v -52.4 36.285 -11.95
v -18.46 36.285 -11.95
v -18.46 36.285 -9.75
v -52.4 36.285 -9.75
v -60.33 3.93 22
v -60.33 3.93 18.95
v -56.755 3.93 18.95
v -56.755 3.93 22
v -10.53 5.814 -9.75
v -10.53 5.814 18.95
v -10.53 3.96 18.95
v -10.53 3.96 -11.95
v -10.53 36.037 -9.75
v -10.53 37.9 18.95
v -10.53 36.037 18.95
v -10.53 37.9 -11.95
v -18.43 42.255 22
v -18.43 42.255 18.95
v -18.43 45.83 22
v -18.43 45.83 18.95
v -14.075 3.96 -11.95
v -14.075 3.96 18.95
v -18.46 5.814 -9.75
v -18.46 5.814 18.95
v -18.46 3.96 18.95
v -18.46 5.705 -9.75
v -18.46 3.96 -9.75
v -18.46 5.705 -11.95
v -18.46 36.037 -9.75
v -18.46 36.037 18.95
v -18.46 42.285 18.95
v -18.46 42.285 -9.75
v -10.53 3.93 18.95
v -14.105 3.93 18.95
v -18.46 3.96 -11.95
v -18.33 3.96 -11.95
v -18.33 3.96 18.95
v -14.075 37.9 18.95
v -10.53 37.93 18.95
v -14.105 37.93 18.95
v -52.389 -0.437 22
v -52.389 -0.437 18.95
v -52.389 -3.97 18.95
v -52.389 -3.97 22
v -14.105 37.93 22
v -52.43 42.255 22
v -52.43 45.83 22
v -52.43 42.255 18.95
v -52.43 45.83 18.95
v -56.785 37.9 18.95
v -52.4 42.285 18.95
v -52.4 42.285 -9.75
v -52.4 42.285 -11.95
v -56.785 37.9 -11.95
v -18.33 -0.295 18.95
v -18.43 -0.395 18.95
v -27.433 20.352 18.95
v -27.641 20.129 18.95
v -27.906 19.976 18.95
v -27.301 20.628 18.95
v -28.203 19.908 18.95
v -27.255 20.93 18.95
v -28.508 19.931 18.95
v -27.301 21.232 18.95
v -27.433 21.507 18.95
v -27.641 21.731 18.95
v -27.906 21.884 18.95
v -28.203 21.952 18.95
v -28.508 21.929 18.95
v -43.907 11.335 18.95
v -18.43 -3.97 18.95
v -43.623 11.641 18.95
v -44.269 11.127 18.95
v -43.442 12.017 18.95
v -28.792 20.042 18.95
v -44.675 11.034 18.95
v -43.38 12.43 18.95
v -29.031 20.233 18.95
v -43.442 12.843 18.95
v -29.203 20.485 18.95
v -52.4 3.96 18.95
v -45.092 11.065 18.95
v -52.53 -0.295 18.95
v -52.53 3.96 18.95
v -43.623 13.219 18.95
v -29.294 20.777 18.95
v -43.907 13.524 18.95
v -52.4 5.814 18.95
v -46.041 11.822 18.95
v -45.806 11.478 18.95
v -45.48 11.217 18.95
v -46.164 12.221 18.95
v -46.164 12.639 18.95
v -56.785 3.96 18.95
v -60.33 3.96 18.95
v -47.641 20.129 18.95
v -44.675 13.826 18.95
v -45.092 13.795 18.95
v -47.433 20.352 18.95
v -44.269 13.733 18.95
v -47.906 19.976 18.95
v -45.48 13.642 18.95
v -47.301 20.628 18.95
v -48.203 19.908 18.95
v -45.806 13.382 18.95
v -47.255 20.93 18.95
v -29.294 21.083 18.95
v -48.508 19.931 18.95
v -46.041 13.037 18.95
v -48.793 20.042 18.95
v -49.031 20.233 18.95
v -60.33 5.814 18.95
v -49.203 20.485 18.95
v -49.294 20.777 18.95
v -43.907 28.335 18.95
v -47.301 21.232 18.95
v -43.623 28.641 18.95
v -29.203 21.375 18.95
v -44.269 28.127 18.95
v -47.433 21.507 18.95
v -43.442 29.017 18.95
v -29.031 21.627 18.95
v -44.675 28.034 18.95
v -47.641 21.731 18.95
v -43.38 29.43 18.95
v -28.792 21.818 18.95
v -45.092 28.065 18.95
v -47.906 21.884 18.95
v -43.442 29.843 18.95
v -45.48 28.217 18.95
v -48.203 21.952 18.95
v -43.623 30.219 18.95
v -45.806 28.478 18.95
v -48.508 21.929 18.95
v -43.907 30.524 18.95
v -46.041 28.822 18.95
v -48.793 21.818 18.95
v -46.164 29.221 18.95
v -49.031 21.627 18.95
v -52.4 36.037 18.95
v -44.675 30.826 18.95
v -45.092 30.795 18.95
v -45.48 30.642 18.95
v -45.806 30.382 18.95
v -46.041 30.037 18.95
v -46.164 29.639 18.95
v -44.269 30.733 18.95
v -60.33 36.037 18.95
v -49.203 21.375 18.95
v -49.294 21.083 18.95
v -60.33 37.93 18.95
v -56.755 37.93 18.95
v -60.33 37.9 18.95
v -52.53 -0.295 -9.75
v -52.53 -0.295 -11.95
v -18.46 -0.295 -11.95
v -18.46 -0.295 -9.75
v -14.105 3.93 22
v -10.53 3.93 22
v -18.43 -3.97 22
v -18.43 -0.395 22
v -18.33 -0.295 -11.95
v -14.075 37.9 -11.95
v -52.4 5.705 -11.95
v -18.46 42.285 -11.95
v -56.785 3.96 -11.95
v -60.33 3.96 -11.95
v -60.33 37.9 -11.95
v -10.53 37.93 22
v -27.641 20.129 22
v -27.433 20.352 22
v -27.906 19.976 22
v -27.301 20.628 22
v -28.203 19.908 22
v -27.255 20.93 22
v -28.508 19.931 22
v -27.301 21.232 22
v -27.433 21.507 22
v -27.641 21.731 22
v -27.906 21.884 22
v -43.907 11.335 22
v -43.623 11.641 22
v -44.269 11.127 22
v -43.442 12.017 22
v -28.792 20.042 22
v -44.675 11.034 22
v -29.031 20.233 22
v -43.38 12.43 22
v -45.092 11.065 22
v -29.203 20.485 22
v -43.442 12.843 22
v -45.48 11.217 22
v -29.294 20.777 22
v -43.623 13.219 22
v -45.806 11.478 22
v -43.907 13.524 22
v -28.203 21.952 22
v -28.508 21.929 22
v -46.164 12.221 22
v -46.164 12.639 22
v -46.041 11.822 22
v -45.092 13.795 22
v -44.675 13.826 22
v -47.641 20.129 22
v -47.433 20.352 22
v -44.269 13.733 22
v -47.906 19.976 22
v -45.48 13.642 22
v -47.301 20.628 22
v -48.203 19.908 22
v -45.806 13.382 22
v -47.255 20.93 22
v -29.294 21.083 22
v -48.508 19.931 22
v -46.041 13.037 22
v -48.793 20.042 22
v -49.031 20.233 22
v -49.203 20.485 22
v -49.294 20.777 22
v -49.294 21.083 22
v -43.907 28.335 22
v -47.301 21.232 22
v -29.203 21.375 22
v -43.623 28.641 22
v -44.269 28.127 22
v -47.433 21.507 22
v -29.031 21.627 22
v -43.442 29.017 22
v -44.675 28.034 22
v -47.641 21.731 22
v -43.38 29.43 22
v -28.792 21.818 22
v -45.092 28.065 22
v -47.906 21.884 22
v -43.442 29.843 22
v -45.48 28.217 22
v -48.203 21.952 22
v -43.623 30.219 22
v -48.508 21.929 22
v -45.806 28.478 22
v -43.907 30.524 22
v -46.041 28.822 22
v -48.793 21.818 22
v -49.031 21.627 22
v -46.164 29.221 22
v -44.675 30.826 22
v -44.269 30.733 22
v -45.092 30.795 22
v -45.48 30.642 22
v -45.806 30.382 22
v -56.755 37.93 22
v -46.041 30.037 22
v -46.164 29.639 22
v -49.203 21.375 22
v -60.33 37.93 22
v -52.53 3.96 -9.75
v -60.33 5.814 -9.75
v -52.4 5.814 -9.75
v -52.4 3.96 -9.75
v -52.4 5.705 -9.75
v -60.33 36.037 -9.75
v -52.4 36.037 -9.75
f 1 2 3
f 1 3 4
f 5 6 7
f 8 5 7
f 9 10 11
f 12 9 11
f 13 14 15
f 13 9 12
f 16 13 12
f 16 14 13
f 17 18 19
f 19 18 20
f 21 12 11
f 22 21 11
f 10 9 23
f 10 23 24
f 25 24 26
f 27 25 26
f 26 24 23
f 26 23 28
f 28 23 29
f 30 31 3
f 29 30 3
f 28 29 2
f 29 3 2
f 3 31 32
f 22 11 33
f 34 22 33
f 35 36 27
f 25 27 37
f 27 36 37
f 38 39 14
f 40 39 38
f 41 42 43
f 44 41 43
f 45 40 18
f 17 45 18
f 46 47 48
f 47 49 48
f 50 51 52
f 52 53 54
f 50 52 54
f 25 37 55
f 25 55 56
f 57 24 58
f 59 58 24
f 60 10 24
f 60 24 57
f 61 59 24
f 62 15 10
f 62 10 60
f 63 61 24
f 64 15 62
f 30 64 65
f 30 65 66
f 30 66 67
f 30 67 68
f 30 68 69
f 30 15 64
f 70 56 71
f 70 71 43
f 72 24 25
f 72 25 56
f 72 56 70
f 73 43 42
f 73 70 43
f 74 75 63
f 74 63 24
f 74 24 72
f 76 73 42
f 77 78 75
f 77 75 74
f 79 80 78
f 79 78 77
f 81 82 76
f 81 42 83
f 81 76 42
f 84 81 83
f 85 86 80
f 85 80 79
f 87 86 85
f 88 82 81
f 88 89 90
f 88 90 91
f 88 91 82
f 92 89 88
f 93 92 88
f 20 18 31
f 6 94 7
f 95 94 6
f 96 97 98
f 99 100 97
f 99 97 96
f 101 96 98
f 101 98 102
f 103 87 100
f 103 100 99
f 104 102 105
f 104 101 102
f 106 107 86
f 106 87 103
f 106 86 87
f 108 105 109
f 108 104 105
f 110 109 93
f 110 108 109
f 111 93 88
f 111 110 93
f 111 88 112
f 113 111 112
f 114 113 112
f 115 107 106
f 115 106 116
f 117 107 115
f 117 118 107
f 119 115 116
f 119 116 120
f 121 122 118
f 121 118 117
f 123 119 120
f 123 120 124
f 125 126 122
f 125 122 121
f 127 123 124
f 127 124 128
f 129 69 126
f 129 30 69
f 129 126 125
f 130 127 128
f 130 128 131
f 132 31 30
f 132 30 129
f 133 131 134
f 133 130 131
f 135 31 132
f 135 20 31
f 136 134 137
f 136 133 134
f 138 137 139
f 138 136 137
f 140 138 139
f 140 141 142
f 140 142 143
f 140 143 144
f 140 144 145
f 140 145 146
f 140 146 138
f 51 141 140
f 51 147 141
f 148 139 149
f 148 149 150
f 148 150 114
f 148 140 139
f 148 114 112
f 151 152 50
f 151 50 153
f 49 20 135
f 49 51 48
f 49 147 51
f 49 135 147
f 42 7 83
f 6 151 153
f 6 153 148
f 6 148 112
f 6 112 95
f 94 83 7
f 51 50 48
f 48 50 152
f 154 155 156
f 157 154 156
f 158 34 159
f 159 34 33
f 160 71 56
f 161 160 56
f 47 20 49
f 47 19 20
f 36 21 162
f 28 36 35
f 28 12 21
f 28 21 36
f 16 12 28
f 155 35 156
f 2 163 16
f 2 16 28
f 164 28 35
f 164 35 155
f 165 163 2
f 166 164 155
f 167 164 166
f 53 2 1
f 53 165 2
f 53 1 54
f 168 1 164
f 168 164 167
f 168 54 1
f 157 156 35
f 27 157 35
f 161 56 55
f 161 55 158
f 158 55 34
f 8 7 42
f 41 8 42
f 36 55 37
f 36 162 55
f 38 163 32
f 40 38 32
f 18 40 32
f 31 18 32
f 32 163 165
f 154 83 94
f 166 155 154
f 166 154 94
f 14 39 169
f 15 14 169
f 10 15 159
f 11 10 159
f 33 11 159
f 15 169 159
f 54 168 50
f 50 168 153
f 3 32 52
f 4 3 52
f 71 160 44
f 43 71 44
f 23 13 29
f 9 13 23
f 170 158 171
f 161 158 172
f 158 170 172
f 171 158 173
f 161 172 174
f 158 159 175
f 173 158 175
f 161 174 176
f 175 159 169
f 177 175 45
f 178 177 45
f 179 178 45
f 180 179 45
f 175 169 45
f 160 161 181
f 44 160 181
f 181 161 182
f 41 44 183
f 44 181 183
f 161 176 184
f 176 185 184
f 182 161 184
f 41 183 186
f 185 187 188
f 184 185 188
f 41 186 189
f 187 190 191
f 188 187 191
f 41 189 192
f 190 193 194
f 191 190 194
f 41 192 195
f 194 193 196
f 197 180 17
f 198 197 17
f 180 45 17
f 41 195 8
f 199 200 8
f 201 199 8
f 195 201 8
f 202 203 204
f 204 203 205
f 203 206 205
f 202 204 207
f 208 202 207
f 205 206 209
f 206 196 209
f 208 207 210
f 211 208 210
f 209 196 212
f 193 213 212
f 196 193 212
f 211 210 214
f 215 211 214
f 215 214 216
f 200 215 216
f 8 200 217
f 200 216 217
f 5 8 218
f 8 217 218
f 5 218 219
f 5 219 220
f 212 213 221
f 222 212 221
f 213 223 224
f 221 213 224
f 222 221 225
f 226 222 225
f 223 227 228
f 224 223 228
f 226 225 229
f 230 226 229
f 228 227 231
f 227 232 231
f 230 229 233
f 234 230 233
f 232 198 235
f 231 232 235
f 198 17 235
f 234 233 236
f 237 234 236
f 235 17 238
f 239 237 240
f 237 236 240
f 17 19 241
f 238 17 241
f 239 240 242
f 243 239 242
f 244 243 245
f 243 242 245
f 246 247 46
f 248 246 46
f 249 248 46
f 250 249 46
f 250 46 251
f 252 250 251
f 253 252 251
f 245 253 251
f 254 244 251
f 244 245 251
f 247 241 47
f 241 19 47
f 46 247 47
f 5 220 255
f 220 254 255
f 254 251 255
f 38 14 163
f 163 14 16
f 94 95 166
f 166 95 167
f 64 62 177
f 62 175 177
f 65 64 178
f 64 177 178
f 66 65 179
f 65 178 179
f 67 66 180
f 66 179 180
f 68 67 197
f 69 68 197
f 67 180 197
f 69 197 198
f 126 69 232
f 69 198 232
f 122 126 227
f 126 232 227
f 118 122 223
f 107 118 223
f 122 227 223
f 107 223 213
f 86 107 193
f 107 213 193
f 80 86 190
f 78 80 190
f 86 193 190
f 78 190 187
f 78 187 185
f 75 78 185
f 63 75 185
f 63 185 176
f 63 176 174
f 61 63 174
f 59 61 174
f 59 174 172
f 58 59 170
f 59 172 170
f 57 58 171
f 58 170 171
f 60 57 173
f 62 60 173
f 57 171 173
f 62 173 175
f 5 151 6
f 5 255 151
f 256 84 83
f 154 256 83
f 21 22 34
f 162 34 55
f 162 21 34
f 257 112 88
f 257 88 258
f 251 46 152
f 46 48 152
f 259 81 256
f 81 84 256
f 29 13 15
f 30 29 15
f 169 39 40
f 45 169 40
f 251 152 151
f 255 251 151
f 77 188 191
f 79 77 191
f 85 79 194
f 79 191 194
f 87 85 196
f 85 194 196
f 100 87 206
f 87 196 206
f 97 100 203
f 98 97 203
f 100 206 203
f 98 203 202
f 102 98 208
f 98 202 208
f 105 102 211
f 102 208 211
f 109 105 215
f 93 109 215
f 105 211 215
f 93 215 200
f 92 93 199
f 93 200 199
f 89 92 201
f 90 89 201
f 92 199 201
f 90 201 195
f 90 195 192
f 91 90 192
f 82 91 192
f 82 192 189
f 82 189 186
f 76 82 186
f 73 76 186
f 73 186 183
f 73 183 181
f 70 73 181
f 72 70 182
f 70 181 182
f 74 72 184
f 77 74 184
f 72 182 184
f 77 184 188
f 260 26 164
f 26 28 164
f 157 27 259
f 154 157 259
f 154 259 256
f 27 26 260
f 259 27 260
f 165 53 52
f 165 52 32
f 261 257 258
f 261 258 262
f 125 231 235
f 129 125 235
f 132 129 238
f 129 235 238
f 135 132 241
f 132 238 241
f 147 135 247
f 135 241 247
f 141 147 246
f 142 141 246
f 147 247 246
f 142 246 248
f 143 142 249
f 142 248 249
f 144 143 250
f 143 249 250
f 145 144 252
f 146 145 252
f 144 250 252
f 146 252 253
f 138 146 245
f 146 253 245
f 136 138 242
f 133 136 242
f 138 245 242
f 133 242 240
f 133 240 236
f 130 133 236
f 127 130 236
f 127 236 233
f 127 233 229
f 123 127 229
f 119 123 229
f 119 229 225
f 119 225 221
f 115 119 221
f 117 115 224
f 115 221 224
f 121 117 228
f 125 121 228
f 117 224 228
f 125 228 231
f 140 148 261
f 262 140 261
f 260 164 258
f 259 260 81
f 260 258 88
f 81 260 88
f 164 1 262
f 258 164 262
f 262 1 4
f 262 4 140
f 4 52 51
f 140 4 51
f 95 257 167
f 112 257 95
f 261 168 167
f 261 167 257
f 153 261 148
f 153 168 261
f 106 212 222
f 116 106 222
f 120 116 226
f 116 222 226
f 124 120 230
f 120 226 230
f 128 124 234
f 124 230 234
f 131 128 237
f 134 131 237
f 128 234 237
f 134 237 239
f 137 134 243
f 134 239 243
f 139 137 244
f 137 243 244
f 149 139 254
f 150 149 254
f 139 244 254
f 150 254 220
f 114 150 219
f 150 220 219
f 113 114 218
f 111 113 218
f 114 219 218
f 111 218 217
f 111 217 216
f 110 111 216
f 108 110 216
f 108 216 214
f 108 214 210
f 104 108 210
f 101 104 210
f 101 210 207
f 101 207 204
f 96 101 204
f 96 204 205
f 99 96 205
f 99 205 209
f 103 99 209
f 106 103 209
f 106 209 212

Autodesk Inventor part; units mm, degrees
ref_plane "Work Plane1" through (-56.3599, 0, 22) normal (0, 0, -1) x (-1, 0, 0)
ref_plane "Arbeitsebene9" through (-61.2799, 5.9299, 18.95) normal (0, 0, 1) x (1, 0, 0)
sketch "Sketch1" plane through (-56.3599, 0, 22) normal (0, 0, -1) x (-1, 0, 0)
  line L0 (-4.0299, -0.3538) -> (-2.2322, 1.4439) construction
  arc A0 (-1.4439, 2.2322) -> (-2.2322, 1.4439) centre (-0.9299, 0.9299) ccw construction
  line L1 (-1.4439, 2.2322) -> (0.3538, 4.0299) construction
  line L2 (-37.8299, 42.8299) -> (-37.8299, 37.8299) construction
  line L3 (-37.8299, 37.8299) -> (-42.9208, 37.8299) construction
  line L4 (-37.8299, 42.2137) -> (-37.8299, 45.8299) construction
  line L5 (-37.8299, 45.8299) -> (-4.0299, 45.8299) construction
  line L6 (-4.0299, 45.8299) -> (-4.0299, 42.2137) construction
  line L7 (-4.0299, 4.0299) -> (0.3538, 4.0299) projected
  circle A1 centre (-20.9299, 20.9299) radius 17.5 projected
  line L8 (-20.9299, 58.9723) -> (17.1124, 20.9299) construction
  line L9 (17.1124, 20.9299) -> (-20.9299, -17.1124) construction
  line L10 (-20.9299, -17.1124) -> (-58.9723, 20.9299) construction
  line L11 (-58.9723, 20.9299) -> (-20.9299, 58.9723) construction
  line L12 (-20.9299, 58.9723) -> (-20.9299, -17.1124) construction
  line L13 (17.1124, 20.9299) -> (-58.9723, 20.9299) construction
  line L14 (-20.9299, 58.9723) -> (32.8701, 58.9723) construction
  line L15 (-43.4299, 43.4299) -> (1.5701, 43.4299) construction
  line L16 (1.5701, 43.4299) -> (1.5701, -1.5701) construction
  line L17 (1.5701, -1.5701) -> (-43.4299, -1.5701) construction
  line L18 (-43.4299, -1.5701) -> (-43.4299, 43.4299) construction
  line L19 (-43.4299, 43.4299) -> (1.5701, -1.5701) construction
  line L20 (1.5701, 43.4299) -> (-43.4299, -1.5701) construction
  line L21 (-43.4299, 5.3876) -> (-43.4299, 36.4723)
  line L22 (-43.4299, 36.4723) -> (-36.4723, 43.4299)
  line L23 (-36.4723, 43.4299) -> (-5.3876, 43.4299)
  line L24 (-5.3876, 43.4299) -> (1.5701, 36.4723)
  line L25 (1.5701, 36.4723) -> (1.5701, 5.3876)
  line L26 (1.5701, 5.3876) -> (-5.3876, -1.5701)
  line L27 (-5.3876, -1.5701) -> (-36.4723, -1.5701)
  line L28 (-36.4723, -1.5701) -> (-43.4299, 5.3876)
  line L29 (-4.0299, 42.2137) -> (-37.8299, 42.2137) projected
  line L30 (-4.0299, -0.3538) -> (-4.0299, 4.0299) projected
  circle A2 centre (-20.9299, 20.9299) radius 1.5
  line L31 (-10.9299, 10.9299) -> (-30.9299, 10.9299) construction
  line L32 (-30.9299, 10.9299) -> (-30.9299, 30.9299) construction
  line L33 (-30.9299, 30.9299) -> (-10.9299, 30.9299) construction
  line L34 (-10.9299, 30.9299) -> (-10.9299, 10.9299) construction
  line L35 (-10.9299, 10.9299) -> (-30.9299, 30.9299) construction
  line L36 (-30.9299, 10.9299) -> (-10.9299, 30.9299) construction
  circle A3 centre (-30.9299, 30.9299) radius 1.4
  circle A4 centre (-30.9299, 10.9299) radius 1.4
  circle A5 centre (-10.9299, 10.9299) radius 1.4
  line L37 (-45.8299, 37.8299) -> (-42.0723, 37.8299) construction
  line L38 (-42.1723, 37.7299) -> (-45.8299, 37.7299)
  line L39 (-45.8299, 37.7299) -> (-45.8299, 4.1299)
  line L40 (-45.8299, 4.1299) -> (-42.1723, 4.1299)
  line L41 (-42.1723, 4.1299) -> (-42.1723, 37.7299)
  line L42 (-45.8299, 4.0299) -> (-42.0723, 4.0299) construction
  line L43 (-45.8299, 37.8299) -> (-42.0723, 37.8299) projected
  line L44 (-37.7299, 45.8299) -> (-4.1299, 45.8299)
  line L45 (-4.1299, 45.8299) -> (-4.1299, 42.1723)
  line L46 (-4.1299, 42.1723) -> (-37.7299, 42.1723)
  line L47 (-37.7299, 42.1723) -> (-37.7299, 45.8299)
  line L48 (0.4701, 37.8299) -> (0.4701, 4.0299) construction
  line L49 (0.4701, 4.0299) -> (3.9701, 4.0299) construction
  line L50 (3.9701, 37.8299) -> (3.9701, 4.0299) construction
  line L51 (0.4701, 37.8299) -> (3.9701, 37.8299) construction
  line L52 (-45.8299, -3.9701) -> (-4.0299, -3.9701) construction
  line L53 (0.3124, 37.7299) -> (3.9701, 37.7299)
  line L54 (3.9701, 37.7299) -> (3.9701, 4.1299)
  line L55 (3.9701, 4.1299) -> (0.3124, 4.1299)
  line L56 (0.3124, 4.1299) -> (0.3124, 37.7299)
  line L57 (-4.1713, -0.3538) -> (-37.7299, -0.3538)
  line L58 (-37.7299, -0.3538) -> (-37.7299, -3.9701)
  line L59 (-37.7299, -3.9701) -> (-4.1713, -3.9701)
  line L60 (-4.1713, -3.9701) -> (-4.1713, -0.3538)
  point P0 (-37.8299, 4.0299)
  dimension "d18" = 53.8
  dimension "d19" = 45
  dimension "d20" = 53.8
  dimension "d21" = 45
  dimension "d22" = 45
  dimension "d30" = 20
  dimension "d31" = 20
  dimension "d32" = 2.8
  dimension "d33" = 2.8
  dimension "d34" = 2.8
  dimension "d35" = 3
  dimension "d36" = 0.1
  dimension "d37" = 0.1
  dimension "d38" = 0.1
  dimension "d39" = 0.1
extrude "Extrusion1" add sketch "Sketch1" along normal up to surface (3.05 mm away) contours L30 L26 L57 L28 L41 L22 L46 L24 L56 L7 | L7 L26 L30 | L56 L24 L25 L26 | L26 L25 L24 L53 L54 L55 | L60 L59 L58 L57 L28 L27 L26 | L26 L27 L28 L57 | L46 L22 L29 L24 | L24 L29 L45 | L40 L39 L38 L22 L21 L28 | L28 L21 L22 L41 | L29 L22 L23 L24 | L24 L23 L22 L29 L47 L44 L45 | L47 L29 L22 | A1 | A2 | A3 | A4 | A5
sketch "Skizze4" plane through (-56.3599, 0, 18.95) normal (0, 0, -1) x (-1, 0, 0)
  line L0 (-37.7299, 42.1723) -> (-42.1723, 37.7299) projected
  line L1 (-42.1723, 37.7299) -> (-45.8299, 37.7299) projected
  line L2 (-45.8299, 37.7299) -> (-45.8299, 4.1299) construction
  line L3 (-45.8299, 4.1299) -> (-42.1723, 4.1299) projected
  line L4 (-42.1723, 4.1299) -> (-37.6885, -0.3538) projected
  line L5 (-37.6885, -0.3538) -> (-37.7299, -0.3538) projected
  line L6 (-37.7299, -0.3538) -> (-37.7299, -3.9701) projected
  line L7 (-37.7299, -3.9701) -> (-4.1713, -3.9701) construction
  line L8 (-4.1713, -3.9701) -> (-4.1713, -0.3538) projected
  line L9 (-4.1713, -0.3538) -> (0.3124, 4.1299) projected
  line L10 (0.3124, 4.1299) -> (3.9701, 4.1299) projected
  line L11 (3.9701, 4.1299) -> (3.9701, 37.7299) construction
  line L12 (3.9701, 37.7299) -> (0.3124, 37.7299) projected
  line L13 (0.3124, 37.7299) -> (-4.1299, 42.1723) projected
  line L14 (-4.1299, 42.1723) -> (-4.1299, 45.8299) projected
  line L15 (-4.1299, 45.8299) -> (-37.7299, 45.8299) construction
  line L16 (-37.7299, 45.8299) -> (-37.7299, 42.1723) projected
  line L17 (-37.9299, 46.0299) -> (-3.9299, 46.0299) construction
  line L18 (-3.9299, 46.0299) -> (-3.9299, 42.2551)
  line L19 (-3.9299, 42.2551) -> (0.3953, 37.9299)
  line L20 (0.3953, 37.9299) -> (4.1701, 37.9299)
  line L21 (4.1701, 37.9299) -> (4.1701, 3.9299) construction
  line L22 (4.1701, 3.9299) -> (0.3953, 3.9299)
  line L23 (0.3953, 3.9299) -> (-3.9713, -0.4367)
  line L24 (-3.9713, -0.4367) -> (-3.9713, -4.1701)
  line L25 (-3.9713, -4.1701) -> (-37.9299, -4.1701) construction
  line L26 (-37.9299, -4.1701) -> (-37.9299, -0.3953)
  line L27 (-37.9299, -0.3953) -> (-42.2551, 3.9299)
  line L28 (-42.2551, 3.9299) -> (-46.0299, 3.9299)
  line L29 (-46.0299, 3.9299) -> (-46.0299, 37.9299) construction
  line L30 (-46.0299, 37.9299) -> (-42.2551, 37.9299)
  line L31 (-42.2551, 37.9299) -> (-37.9299, 42.2551)
  line L32 (-37.9299, 42.2551) -> (-37.9299, 46.0299)
  line L33 (-45.8299, 37.7299) -> (-45.8299, 37.9299)
  line L34 (-4.1299, 45.8299) -> (-37.7299, 45.8299) projected
  line L35 (-37.7299, 45.8299) -> (-37.9299, 45.8299)
  line L36 (-4.1299, 45.8299) -> (-3.9299, 45.8299)
  line L37 (3.9701, 37.7299) -> (3.9701, 37.9299)
  line L38 (3.9701, 4.1299) -> (3.9701, 37.7299) projected
  line L39 (3.9701, 4.1299) -> (3.9701, 3.9299)
  line L40 (-4.1713, -3.9701) -> (-3.9713, -3.9701)
  line L41 (-37.7299, -3.9701) -> (-37.9299, -3.9701)
  line L42 (-45.8299, 4.1299) -> (-45.8299, 3.9299)
  point P0 (-56.3599, 0)
  dimension "d40" = 0.2
extrude "IM_offset" add sketch "Skizze4" against normal up to surface (3.05 mm away)
ref_plane "Arbeitsebene5" through (-35.4299, 3.9299, 22) normal (-1, 0, 0) x (0, 0, 1)
ref_plane "Arbeitsebene6" through (-18.4299, 20.9299, 22) normal (0, 1, 0) x (-1, 0, 0)
sketch "Skizze31" plane through (-10.5299, 3.9299, 18.95) normal (1, 0, 0) x (0, 0, -1)
  line L0 (0, 0) -> (0, 34) projected
  line L1 (0, 34) -> (-3.05, 34) projected
  line L2 (-3.05, 0) -> (-3.05, 34) projected
  line L3 (0, 0) -> (-3.05, 0) projected
  line L4 (-3.05, -5.85) -> (-10.55, -5.85) projected
  line L5 (-3.05, 33.97) -> (-3.05, -5.85) projected
  line L6 (-3.05, 33.97) -> (31.05, 33.97) projected
  line L7 (31.05, 39.85) -> (31.05, 33.97) projected
  line L8 (-10.55, 39.85) -> (31.05, 39.85) projected
  line L9 (-10.55, -5.85) -> (-10.55, 39.85) projected
  line L10 (31.05, 39.85) -> (38.55, 39.85) projected
  line L11 (31.05, 0.03) -> (31.05, 39.85) projected
  line L12 (31.05, 0.03) -> (-3.05, 0.03) projected
  line L13 (-3.05, -5.85) -> (-3.05, 0.03) projected
  line L14 (38.55, -5.85) -> (-3.05, -5.85) projected
  line L15 (38.55, 39.85) -> (38.55, -5.85) projected
  line L16 (0, 0) -> (0, 34) projected
  line L17 (0, 33.97) -> (30.9, 33.97)
  line L18 (30.9, 33.97) -> (30.9, 32.1075)
  line L19 (30.9, 32.1075) -> (0, 32.1075)
  line L20 (0, 32.1075) -> (0, 33.97)
  line L21 (30.9, 1.8846) -> (0, 1.8846)
  line L22 (0, 1.8846) -> (0, 0.03)
  line L23 (0, 0.03) -> (30.9, 0.03)
  line L24 (30.9, 0.03) -> (30.9, 1.8846)
  circle A0 centre (20.35, 17) radius 6.5 projected
  line L25 (30.9, 32.1075) -> (30.9, 1.8846)
  line L26 (28.5, 2) -> (28.5, 32) projected
  line L27 (28.7, 32.1075) -> (28.7, 1.8846)
  point P0 (18.95, -3.9299)
  point P1 (0, 33.97)
  point P2 (0, 1.8846)
  point P3 (0, 0.03)
  dimension "d181" = 0
  dimension "d182" = 0
  dimension "d183" = 0.15
  dimension "d184" = 0.2
ref_plane "Arbeitsebene10" through (-18.4599, -3.9201, -16.28) normal (-1, 0, 0) x (0, 0, 1)
extrude "Extrusion26" add sketch "Skizze31" against normal up to surface (7.93 mm away) contours L0 L21 L24 L12 | L0 L6 L18 L19 | L27 L19 L25 L21
sketch "Skizze32" plane through (-10.5299, 3.9599, -11.95) normal (0, 0, -1) x (-1, 0, 0)
  line L0 (0, 0) -> (0, 33.94) projected
  line L1 (0, 33.94) -> (7.93, 33.94) projected
  line L2 (0, 0) -> (7.93, 0) projected
  line L3 (7.9, -4.3552) -> (3.5748, -0.03) construction
  line L4 (4.3761, 34.7834) -> (7.1197, 37.7973) construction
  line L5 (7.9, 38.2952) -> (3.5748, 33.97) construction
  line L6 (3.5448, 33.94) -> (7.93, 38.3252)
  line L7 (7.93, 38.3252) -> (7.93, 33.94)
  line L8 (7.93, 1.8546) -> (7.93, 0) projected
  line L9 (7.93, 0) -> (7.93, -0.13)
  line L10 (3.5448, 0) -> (7.8, -4.2552)
  line L11 (7.8, -4.2552) -> (7.8, 0)
  point P0 (-10.5299, -3.9599)
  dimension "d187" = 45
  dimension "d188" = 0
  dimension "d189" = 0
extrude "Extrusion27" add sketch "Skizze32" against normal up to surface (30.9 mm away)
mirror "Spiegeln2" about plane through (-35.4299, 3.9299, 22) normal (-1, 0, 0) of "Extrusion26", "Extrusion27"
sketch "Skizze33" plane through (-10.5299, 3.9599, -11.95) normal (0, 0, -1) x (-1, 0, 0)
  line L0 (0.05, 39.82) -> (0.05, -5.88) projected
  line L1 (41.87, 0) -> (41.87, 38.3252) projected
  line L2 (7.93, 0) -> (7.93, 38.3252) projected
  line L3 (41.87, 38.3252) -> (7.93, 38.3252)
  line L4 (7.93, 38.3252) -> (7.93, 32.3252)
  line L5 (7.93, 32.3252) -> (41.87, 32.3252)
  line L6 (41.87, 32.3252) -> (41.87, 38.3252)
  line L7 (46.2552, 0) -> (42, -4.2552) projected
  line L8 (42, -4.2552) -> (7.93, -4.2552)
  line L9 (7.93, -4.2552) -> (7.93, 1.7448)
  line L10 (7.93, 1.7448) -> (42, 1.7448)
  line L11 (42, 1.7448) -> (42, -4.2552)
  point P0 (-10.5299, -3.9599)
  point P1 (7.93, 38.3252)
  point P2 (41.87, 32.3252)
  dimension "d192" = 6
  dimension "d193" = 6
extrude "Extrusion28" add sketch "Skizze33" against normal up to surface (2.2 mm away) contours L5 L2 L3 L1 | L10 L11 L8 L9 L2
sketch "Skizze34" plane through (-56.3599, 0, 22) normal (0, 0, 1) x (1, 0, 0)
  line L0 (-4.9201, 35.9299) -> (-4.9201, 5.9299) projected
  line L1 (83.0799, 5.9299) -> (-4.9201, 5.9299) projected
  line L2 (83.0799, 35.9299) -> (83.0799, 5.9299) projected
  line L3 (83.0799, 35.9299) -> (-4.9201, 35.9299) projected
  circle A0 centre (8.0799, 20.9299) radius 1.025 projected
  circle A1 centre (28.0799, 20.9299) radius 1.025 projected
  circle A2 centre (48.0799, 20.9299) radius 1.025 projected
  circle A3 centre (68.0799, 20.9299) radius 1.025 projected
  circle A4 centre (66.5799, 29.4299) radius 1.7 projected
  circle A5 centre (66.5799, 12.4299) radius 1.7 projected
  circle A6 centre (11.5799, 12.4299) radius 1.7 construction
  circle A7 centre (11.5799, 29.4299) radius 1.7 construction
  circle A8 centre (11.5799, 12.4299) radius 1.4
  circle A9 centre (11.5799, 29.4299) radius 1.4
  point P0 (56.3599, 0)
  dimension "d198" = 2.8
  dimension "d199" = 2.8
extrude "Extrusion29" cut sketch "Skizze34" against normal blind 10 contours A0 | A1 | A8 | A9
properties part number "20_Cube_Insert_Cube_Z-Stage_NEMA11_china_v3"
